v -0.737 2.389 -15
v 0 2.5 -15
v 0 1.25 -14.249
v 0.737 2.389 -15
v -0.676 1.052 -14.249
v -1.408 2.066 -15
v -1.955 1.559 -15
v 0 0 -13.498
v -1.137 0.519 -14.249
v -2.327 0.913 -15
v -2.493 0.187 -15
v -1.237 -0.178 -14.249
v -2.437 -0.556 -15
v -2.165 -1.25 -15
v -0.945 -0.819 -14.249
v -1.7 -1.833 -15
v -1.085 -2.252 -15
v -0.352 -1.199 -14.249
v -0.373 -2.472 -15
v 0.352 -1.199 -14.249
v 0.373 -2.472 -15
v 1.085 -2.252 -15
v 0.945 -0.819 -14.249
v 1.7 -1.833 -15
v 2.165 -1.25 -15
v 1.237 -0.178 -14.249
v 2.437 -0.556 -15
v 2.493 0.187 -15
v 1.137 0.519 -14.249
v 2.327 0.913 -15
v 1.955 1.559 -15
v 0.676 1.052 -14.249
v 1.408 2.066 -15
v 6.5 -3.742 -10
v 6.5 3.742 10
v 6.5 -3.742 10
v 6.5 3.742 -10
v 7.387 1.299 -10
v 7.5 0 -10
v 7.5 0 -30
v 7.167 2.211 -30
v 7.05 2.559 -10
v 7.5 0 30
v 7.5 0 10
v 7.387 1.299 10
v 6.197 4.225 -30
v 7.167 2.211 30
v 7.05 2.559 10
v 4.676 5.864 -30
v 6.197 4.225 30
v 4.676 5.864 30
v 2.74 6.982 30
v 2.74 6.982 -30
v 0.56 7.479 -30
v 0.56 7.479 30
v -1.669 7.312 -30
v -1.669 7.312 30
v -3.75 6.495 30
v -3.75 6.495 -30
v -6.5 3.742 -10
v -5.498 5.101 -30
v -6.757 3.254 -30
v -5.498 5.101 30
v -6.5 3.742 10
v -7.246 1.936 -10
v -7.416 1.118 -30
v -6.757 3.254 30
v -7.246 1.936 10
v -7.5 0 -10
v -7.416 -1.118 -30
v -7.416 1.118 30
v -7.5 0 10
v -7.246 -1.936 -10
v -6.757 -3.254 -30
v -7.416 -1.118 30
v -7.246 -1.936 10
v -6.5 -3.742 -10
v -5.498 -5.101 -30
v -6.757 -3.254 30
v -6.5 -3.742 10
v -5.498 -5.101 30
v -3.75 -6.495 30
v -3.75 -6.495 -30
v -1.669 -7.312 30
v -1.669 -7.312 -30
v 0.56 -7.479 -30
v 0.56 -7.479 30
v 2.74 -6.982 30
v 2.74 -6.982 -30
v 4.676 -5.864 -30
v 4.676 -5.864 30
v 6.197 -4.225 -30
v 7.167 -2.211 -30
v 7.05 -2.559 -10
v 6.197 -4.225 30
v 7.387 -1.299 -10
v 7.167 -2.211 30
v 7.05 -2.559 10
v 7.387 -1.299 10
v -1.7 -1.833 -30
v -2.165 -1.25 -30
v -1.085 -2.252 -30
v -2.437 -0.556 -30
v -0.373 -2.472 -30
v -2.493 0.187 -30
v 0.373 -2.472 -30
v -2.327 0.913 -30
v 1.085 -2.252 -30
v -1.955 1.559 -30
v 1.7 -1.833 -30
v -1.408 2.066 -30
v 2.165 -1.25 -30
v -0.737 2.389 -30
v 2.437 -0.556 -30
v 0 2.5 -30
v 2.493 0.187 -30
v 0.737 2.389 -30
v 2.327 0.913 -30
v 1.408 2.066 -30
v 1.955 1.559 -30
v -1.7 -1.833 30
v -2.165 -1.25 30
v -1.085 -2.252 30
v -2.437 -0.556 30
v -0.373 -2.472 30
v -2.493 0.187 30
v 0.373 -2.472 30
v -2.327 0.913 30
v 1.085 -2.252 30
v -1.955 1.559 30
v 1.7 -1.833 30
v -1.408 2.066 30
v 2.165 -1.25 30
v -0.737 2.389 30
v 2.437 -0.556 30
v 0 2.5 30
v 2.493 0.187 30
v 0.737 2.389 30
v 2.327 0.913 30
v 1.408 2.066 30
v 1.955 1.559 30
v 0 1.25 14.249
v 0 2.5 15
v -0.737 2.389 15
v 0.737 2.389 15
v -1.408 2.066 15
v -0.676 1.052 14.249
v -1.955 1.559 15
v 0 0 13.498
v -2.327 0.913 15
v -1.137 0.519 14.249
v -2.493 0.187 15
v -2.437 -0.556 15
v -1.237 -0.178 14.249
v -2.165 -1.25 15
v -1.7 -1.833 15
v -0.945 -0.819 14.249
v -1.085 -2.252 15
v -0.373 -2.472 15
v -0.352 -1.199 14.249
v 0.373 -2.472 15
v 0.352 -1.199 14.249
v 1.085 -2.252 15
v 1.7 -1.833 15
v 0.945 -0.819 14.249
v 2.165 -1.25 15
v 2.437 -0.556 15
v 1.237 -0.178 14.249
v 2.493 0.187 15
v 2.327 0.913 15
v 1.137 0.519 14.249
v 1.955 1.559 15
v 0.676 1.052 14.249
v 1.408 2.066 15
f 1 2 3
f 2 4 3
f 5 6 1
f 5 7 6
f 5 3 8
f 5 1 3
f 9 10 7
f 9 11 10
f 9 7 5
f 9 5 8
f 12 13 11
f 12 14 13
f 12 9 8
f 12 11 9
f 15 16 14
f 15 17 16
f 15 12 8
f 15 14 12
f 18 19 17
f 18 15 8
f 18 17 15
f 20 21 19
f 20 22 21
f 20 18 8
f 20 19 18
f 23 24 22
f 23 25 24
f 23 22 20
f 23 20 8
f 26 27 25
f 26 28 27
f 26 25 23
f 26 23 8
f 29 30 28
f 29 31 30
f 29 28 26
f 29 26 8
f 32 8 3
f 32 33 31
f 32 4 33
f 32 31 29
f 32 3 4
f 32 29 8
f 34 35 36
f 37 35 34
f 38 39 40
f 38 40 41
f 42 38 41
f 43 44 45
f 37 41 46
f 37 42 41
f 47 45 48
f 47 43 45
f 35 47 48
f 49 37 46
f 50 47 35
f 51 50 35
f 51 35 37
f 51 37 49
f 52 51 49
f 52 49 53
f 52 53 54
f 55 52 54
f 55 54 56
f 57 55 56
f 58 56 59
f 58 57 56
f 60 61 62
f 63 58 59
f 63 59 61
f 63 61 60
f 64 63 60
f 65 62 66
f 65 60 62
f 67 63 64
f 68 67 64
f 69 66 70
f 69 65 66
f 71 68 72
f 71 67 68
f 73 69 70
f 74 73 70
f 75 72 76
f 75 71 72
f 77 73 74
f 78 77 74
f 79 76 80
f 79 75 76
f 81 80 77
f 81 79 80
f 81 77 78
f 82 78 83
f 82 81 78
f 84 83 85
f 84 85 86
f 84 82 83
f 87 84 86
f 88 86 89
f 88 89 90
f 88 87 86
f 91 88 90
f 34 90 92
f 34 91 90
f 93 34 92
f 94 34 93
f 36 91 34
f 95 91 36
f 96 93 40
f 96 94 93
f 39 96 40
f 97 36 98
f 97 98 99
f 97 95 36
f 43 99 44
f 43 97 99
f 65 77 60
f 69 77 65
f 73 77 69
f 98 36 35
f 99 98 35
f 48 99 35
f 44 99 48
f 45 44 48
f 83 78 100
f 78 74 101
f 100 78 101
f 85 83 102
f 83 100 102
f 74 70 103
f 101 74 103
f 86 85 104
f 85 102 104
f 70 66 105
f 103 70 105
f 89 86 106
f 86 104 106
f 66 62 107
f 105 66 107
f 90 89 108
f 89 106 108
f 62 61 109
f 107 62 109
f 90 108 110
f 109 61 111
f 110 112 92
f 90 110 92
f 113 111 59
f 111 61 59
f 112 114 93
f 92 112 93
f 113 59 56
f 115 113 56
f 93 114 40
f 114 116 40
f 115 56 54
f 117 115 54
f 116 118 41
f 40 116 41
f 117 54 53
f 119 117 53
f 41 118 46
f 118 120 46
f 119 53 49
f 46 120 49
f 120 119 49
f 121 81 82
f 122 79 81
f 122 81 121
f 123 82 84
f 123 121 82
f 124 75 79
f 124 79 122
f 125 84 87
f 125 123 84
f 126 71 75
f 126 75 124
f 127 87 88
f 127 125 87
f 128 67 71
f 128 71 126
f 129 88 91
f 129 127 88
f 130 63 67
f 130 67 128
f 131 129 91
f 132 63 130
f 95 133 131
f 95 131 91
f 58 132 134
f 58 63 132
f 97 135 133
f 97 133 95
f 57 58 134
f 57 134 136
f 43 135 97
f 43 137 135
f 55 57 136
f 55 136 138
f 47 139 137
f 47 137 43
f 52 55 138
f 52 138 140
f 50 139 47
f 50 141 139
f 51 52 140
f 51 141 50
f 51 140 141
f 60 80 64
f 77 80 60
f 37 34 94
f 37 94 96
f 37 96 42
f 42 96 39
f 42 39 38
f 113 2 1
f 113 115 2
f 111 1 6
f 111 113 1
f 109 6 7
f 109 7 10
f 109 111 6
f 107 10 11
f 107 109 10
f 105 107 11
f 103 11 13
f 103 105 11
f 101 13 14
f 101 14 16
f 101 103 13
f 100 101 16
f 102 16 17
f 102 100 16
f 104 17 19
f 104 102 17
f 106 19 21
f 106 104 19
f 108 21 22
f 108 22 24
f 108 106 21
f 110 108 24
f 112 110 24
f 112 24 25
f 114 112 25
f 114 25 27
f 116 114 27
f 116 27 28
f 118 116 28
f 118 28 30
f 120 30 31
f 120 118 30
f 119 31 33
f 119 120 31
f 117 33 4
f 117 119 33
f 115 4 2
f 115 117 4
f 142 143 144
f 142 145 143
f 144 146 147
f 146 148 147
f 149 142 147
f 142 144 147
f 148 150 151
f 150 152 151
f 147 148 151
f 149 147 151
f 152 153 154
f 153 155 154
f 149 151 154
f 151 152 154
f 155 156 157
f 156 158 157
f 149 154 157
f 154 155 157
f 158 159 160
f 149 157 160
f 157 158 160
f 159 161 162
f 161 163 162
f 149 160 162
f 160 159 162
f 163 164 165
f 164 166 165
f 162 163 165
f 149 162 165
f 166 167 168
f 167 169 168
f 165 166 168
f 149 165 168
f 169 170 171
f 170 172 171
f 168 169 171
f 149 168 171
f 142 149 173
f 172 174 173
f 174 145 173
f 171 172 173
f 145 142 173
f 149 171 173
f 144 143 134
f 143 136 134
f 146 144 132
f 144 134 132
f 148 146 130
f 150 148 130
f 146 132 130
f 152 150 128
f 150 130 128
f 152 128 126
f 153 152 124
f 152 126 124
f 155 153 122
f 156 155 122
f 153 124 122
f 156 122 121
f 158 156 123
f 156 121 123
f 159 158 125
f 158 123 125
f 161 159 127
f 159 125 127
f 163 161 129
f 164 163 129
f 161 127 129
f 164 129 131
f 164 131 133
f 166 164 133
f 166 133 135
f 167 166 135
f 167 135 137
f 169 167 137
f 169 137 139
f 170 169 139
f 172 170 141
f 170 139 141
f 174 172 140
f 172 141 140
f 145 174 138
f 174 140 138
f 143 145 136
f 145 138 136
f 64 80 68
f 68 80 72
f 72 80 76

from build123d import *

# Parameters (mm, degrees)
SKETCH_1_R          = 7.5
EXTRUDE_1_DEPTH     = 30
SKETCH_2_W          = 2
SKETCH_2_H          = 20
CUT_EXTRUDE_1_DEPTH = 10


with BuildPart() as part:
    # 草图1 → 凸台-拉伸1 (new body, symmetric)
    with BuildSketch(Plane.XY):
        Circle(SKETCH_1_R)
    extrude(amount=EXTRUDE_1_DEPTH, both=True)

    # 草图2 → 切除-拉伸1 (cut, symmetric)
    with BuildSketch(Plane(origin=(0, 0, 0), x_dir=(1, 0, 0), z_dir=(0, 1, 0))):
        with Locations((-7.5, 0)):
            Rectangle(SKETCH_2_W, SKETCH_2_H)
        with Locations((7.5, 0)):
            Rectangle(SKETCH_2_W, SKETCH_2_H)
    extrude(amount=CUT_EXTRUDE_1_DEPTH, both=True, mode=Mode.SUBTRACT)

    # 草图5 → M6 螺纹孔1 (revolve, cut)
    with BuildSketch(Plane(origin=(0, 0, -30), x_dir=(0, 1, 0), z_dir=(1, 0, 0))):
        Polygon((0, 0), (0, 16.502151548), (2.5, 15), (2.5, 0), align=None)
    hole_wizard_m6_1 = revolve(axis=Axis((0, 0, -36.35), (0, 0, 1)), mode=Mode.SUBTRACT)

    # 镜向1: M6 螺纹孔1 across plane
    add(hole_wizard_m6_1.mirror(Plane.XY), mode=Mode.SUBTRACT)


solid = part.part
